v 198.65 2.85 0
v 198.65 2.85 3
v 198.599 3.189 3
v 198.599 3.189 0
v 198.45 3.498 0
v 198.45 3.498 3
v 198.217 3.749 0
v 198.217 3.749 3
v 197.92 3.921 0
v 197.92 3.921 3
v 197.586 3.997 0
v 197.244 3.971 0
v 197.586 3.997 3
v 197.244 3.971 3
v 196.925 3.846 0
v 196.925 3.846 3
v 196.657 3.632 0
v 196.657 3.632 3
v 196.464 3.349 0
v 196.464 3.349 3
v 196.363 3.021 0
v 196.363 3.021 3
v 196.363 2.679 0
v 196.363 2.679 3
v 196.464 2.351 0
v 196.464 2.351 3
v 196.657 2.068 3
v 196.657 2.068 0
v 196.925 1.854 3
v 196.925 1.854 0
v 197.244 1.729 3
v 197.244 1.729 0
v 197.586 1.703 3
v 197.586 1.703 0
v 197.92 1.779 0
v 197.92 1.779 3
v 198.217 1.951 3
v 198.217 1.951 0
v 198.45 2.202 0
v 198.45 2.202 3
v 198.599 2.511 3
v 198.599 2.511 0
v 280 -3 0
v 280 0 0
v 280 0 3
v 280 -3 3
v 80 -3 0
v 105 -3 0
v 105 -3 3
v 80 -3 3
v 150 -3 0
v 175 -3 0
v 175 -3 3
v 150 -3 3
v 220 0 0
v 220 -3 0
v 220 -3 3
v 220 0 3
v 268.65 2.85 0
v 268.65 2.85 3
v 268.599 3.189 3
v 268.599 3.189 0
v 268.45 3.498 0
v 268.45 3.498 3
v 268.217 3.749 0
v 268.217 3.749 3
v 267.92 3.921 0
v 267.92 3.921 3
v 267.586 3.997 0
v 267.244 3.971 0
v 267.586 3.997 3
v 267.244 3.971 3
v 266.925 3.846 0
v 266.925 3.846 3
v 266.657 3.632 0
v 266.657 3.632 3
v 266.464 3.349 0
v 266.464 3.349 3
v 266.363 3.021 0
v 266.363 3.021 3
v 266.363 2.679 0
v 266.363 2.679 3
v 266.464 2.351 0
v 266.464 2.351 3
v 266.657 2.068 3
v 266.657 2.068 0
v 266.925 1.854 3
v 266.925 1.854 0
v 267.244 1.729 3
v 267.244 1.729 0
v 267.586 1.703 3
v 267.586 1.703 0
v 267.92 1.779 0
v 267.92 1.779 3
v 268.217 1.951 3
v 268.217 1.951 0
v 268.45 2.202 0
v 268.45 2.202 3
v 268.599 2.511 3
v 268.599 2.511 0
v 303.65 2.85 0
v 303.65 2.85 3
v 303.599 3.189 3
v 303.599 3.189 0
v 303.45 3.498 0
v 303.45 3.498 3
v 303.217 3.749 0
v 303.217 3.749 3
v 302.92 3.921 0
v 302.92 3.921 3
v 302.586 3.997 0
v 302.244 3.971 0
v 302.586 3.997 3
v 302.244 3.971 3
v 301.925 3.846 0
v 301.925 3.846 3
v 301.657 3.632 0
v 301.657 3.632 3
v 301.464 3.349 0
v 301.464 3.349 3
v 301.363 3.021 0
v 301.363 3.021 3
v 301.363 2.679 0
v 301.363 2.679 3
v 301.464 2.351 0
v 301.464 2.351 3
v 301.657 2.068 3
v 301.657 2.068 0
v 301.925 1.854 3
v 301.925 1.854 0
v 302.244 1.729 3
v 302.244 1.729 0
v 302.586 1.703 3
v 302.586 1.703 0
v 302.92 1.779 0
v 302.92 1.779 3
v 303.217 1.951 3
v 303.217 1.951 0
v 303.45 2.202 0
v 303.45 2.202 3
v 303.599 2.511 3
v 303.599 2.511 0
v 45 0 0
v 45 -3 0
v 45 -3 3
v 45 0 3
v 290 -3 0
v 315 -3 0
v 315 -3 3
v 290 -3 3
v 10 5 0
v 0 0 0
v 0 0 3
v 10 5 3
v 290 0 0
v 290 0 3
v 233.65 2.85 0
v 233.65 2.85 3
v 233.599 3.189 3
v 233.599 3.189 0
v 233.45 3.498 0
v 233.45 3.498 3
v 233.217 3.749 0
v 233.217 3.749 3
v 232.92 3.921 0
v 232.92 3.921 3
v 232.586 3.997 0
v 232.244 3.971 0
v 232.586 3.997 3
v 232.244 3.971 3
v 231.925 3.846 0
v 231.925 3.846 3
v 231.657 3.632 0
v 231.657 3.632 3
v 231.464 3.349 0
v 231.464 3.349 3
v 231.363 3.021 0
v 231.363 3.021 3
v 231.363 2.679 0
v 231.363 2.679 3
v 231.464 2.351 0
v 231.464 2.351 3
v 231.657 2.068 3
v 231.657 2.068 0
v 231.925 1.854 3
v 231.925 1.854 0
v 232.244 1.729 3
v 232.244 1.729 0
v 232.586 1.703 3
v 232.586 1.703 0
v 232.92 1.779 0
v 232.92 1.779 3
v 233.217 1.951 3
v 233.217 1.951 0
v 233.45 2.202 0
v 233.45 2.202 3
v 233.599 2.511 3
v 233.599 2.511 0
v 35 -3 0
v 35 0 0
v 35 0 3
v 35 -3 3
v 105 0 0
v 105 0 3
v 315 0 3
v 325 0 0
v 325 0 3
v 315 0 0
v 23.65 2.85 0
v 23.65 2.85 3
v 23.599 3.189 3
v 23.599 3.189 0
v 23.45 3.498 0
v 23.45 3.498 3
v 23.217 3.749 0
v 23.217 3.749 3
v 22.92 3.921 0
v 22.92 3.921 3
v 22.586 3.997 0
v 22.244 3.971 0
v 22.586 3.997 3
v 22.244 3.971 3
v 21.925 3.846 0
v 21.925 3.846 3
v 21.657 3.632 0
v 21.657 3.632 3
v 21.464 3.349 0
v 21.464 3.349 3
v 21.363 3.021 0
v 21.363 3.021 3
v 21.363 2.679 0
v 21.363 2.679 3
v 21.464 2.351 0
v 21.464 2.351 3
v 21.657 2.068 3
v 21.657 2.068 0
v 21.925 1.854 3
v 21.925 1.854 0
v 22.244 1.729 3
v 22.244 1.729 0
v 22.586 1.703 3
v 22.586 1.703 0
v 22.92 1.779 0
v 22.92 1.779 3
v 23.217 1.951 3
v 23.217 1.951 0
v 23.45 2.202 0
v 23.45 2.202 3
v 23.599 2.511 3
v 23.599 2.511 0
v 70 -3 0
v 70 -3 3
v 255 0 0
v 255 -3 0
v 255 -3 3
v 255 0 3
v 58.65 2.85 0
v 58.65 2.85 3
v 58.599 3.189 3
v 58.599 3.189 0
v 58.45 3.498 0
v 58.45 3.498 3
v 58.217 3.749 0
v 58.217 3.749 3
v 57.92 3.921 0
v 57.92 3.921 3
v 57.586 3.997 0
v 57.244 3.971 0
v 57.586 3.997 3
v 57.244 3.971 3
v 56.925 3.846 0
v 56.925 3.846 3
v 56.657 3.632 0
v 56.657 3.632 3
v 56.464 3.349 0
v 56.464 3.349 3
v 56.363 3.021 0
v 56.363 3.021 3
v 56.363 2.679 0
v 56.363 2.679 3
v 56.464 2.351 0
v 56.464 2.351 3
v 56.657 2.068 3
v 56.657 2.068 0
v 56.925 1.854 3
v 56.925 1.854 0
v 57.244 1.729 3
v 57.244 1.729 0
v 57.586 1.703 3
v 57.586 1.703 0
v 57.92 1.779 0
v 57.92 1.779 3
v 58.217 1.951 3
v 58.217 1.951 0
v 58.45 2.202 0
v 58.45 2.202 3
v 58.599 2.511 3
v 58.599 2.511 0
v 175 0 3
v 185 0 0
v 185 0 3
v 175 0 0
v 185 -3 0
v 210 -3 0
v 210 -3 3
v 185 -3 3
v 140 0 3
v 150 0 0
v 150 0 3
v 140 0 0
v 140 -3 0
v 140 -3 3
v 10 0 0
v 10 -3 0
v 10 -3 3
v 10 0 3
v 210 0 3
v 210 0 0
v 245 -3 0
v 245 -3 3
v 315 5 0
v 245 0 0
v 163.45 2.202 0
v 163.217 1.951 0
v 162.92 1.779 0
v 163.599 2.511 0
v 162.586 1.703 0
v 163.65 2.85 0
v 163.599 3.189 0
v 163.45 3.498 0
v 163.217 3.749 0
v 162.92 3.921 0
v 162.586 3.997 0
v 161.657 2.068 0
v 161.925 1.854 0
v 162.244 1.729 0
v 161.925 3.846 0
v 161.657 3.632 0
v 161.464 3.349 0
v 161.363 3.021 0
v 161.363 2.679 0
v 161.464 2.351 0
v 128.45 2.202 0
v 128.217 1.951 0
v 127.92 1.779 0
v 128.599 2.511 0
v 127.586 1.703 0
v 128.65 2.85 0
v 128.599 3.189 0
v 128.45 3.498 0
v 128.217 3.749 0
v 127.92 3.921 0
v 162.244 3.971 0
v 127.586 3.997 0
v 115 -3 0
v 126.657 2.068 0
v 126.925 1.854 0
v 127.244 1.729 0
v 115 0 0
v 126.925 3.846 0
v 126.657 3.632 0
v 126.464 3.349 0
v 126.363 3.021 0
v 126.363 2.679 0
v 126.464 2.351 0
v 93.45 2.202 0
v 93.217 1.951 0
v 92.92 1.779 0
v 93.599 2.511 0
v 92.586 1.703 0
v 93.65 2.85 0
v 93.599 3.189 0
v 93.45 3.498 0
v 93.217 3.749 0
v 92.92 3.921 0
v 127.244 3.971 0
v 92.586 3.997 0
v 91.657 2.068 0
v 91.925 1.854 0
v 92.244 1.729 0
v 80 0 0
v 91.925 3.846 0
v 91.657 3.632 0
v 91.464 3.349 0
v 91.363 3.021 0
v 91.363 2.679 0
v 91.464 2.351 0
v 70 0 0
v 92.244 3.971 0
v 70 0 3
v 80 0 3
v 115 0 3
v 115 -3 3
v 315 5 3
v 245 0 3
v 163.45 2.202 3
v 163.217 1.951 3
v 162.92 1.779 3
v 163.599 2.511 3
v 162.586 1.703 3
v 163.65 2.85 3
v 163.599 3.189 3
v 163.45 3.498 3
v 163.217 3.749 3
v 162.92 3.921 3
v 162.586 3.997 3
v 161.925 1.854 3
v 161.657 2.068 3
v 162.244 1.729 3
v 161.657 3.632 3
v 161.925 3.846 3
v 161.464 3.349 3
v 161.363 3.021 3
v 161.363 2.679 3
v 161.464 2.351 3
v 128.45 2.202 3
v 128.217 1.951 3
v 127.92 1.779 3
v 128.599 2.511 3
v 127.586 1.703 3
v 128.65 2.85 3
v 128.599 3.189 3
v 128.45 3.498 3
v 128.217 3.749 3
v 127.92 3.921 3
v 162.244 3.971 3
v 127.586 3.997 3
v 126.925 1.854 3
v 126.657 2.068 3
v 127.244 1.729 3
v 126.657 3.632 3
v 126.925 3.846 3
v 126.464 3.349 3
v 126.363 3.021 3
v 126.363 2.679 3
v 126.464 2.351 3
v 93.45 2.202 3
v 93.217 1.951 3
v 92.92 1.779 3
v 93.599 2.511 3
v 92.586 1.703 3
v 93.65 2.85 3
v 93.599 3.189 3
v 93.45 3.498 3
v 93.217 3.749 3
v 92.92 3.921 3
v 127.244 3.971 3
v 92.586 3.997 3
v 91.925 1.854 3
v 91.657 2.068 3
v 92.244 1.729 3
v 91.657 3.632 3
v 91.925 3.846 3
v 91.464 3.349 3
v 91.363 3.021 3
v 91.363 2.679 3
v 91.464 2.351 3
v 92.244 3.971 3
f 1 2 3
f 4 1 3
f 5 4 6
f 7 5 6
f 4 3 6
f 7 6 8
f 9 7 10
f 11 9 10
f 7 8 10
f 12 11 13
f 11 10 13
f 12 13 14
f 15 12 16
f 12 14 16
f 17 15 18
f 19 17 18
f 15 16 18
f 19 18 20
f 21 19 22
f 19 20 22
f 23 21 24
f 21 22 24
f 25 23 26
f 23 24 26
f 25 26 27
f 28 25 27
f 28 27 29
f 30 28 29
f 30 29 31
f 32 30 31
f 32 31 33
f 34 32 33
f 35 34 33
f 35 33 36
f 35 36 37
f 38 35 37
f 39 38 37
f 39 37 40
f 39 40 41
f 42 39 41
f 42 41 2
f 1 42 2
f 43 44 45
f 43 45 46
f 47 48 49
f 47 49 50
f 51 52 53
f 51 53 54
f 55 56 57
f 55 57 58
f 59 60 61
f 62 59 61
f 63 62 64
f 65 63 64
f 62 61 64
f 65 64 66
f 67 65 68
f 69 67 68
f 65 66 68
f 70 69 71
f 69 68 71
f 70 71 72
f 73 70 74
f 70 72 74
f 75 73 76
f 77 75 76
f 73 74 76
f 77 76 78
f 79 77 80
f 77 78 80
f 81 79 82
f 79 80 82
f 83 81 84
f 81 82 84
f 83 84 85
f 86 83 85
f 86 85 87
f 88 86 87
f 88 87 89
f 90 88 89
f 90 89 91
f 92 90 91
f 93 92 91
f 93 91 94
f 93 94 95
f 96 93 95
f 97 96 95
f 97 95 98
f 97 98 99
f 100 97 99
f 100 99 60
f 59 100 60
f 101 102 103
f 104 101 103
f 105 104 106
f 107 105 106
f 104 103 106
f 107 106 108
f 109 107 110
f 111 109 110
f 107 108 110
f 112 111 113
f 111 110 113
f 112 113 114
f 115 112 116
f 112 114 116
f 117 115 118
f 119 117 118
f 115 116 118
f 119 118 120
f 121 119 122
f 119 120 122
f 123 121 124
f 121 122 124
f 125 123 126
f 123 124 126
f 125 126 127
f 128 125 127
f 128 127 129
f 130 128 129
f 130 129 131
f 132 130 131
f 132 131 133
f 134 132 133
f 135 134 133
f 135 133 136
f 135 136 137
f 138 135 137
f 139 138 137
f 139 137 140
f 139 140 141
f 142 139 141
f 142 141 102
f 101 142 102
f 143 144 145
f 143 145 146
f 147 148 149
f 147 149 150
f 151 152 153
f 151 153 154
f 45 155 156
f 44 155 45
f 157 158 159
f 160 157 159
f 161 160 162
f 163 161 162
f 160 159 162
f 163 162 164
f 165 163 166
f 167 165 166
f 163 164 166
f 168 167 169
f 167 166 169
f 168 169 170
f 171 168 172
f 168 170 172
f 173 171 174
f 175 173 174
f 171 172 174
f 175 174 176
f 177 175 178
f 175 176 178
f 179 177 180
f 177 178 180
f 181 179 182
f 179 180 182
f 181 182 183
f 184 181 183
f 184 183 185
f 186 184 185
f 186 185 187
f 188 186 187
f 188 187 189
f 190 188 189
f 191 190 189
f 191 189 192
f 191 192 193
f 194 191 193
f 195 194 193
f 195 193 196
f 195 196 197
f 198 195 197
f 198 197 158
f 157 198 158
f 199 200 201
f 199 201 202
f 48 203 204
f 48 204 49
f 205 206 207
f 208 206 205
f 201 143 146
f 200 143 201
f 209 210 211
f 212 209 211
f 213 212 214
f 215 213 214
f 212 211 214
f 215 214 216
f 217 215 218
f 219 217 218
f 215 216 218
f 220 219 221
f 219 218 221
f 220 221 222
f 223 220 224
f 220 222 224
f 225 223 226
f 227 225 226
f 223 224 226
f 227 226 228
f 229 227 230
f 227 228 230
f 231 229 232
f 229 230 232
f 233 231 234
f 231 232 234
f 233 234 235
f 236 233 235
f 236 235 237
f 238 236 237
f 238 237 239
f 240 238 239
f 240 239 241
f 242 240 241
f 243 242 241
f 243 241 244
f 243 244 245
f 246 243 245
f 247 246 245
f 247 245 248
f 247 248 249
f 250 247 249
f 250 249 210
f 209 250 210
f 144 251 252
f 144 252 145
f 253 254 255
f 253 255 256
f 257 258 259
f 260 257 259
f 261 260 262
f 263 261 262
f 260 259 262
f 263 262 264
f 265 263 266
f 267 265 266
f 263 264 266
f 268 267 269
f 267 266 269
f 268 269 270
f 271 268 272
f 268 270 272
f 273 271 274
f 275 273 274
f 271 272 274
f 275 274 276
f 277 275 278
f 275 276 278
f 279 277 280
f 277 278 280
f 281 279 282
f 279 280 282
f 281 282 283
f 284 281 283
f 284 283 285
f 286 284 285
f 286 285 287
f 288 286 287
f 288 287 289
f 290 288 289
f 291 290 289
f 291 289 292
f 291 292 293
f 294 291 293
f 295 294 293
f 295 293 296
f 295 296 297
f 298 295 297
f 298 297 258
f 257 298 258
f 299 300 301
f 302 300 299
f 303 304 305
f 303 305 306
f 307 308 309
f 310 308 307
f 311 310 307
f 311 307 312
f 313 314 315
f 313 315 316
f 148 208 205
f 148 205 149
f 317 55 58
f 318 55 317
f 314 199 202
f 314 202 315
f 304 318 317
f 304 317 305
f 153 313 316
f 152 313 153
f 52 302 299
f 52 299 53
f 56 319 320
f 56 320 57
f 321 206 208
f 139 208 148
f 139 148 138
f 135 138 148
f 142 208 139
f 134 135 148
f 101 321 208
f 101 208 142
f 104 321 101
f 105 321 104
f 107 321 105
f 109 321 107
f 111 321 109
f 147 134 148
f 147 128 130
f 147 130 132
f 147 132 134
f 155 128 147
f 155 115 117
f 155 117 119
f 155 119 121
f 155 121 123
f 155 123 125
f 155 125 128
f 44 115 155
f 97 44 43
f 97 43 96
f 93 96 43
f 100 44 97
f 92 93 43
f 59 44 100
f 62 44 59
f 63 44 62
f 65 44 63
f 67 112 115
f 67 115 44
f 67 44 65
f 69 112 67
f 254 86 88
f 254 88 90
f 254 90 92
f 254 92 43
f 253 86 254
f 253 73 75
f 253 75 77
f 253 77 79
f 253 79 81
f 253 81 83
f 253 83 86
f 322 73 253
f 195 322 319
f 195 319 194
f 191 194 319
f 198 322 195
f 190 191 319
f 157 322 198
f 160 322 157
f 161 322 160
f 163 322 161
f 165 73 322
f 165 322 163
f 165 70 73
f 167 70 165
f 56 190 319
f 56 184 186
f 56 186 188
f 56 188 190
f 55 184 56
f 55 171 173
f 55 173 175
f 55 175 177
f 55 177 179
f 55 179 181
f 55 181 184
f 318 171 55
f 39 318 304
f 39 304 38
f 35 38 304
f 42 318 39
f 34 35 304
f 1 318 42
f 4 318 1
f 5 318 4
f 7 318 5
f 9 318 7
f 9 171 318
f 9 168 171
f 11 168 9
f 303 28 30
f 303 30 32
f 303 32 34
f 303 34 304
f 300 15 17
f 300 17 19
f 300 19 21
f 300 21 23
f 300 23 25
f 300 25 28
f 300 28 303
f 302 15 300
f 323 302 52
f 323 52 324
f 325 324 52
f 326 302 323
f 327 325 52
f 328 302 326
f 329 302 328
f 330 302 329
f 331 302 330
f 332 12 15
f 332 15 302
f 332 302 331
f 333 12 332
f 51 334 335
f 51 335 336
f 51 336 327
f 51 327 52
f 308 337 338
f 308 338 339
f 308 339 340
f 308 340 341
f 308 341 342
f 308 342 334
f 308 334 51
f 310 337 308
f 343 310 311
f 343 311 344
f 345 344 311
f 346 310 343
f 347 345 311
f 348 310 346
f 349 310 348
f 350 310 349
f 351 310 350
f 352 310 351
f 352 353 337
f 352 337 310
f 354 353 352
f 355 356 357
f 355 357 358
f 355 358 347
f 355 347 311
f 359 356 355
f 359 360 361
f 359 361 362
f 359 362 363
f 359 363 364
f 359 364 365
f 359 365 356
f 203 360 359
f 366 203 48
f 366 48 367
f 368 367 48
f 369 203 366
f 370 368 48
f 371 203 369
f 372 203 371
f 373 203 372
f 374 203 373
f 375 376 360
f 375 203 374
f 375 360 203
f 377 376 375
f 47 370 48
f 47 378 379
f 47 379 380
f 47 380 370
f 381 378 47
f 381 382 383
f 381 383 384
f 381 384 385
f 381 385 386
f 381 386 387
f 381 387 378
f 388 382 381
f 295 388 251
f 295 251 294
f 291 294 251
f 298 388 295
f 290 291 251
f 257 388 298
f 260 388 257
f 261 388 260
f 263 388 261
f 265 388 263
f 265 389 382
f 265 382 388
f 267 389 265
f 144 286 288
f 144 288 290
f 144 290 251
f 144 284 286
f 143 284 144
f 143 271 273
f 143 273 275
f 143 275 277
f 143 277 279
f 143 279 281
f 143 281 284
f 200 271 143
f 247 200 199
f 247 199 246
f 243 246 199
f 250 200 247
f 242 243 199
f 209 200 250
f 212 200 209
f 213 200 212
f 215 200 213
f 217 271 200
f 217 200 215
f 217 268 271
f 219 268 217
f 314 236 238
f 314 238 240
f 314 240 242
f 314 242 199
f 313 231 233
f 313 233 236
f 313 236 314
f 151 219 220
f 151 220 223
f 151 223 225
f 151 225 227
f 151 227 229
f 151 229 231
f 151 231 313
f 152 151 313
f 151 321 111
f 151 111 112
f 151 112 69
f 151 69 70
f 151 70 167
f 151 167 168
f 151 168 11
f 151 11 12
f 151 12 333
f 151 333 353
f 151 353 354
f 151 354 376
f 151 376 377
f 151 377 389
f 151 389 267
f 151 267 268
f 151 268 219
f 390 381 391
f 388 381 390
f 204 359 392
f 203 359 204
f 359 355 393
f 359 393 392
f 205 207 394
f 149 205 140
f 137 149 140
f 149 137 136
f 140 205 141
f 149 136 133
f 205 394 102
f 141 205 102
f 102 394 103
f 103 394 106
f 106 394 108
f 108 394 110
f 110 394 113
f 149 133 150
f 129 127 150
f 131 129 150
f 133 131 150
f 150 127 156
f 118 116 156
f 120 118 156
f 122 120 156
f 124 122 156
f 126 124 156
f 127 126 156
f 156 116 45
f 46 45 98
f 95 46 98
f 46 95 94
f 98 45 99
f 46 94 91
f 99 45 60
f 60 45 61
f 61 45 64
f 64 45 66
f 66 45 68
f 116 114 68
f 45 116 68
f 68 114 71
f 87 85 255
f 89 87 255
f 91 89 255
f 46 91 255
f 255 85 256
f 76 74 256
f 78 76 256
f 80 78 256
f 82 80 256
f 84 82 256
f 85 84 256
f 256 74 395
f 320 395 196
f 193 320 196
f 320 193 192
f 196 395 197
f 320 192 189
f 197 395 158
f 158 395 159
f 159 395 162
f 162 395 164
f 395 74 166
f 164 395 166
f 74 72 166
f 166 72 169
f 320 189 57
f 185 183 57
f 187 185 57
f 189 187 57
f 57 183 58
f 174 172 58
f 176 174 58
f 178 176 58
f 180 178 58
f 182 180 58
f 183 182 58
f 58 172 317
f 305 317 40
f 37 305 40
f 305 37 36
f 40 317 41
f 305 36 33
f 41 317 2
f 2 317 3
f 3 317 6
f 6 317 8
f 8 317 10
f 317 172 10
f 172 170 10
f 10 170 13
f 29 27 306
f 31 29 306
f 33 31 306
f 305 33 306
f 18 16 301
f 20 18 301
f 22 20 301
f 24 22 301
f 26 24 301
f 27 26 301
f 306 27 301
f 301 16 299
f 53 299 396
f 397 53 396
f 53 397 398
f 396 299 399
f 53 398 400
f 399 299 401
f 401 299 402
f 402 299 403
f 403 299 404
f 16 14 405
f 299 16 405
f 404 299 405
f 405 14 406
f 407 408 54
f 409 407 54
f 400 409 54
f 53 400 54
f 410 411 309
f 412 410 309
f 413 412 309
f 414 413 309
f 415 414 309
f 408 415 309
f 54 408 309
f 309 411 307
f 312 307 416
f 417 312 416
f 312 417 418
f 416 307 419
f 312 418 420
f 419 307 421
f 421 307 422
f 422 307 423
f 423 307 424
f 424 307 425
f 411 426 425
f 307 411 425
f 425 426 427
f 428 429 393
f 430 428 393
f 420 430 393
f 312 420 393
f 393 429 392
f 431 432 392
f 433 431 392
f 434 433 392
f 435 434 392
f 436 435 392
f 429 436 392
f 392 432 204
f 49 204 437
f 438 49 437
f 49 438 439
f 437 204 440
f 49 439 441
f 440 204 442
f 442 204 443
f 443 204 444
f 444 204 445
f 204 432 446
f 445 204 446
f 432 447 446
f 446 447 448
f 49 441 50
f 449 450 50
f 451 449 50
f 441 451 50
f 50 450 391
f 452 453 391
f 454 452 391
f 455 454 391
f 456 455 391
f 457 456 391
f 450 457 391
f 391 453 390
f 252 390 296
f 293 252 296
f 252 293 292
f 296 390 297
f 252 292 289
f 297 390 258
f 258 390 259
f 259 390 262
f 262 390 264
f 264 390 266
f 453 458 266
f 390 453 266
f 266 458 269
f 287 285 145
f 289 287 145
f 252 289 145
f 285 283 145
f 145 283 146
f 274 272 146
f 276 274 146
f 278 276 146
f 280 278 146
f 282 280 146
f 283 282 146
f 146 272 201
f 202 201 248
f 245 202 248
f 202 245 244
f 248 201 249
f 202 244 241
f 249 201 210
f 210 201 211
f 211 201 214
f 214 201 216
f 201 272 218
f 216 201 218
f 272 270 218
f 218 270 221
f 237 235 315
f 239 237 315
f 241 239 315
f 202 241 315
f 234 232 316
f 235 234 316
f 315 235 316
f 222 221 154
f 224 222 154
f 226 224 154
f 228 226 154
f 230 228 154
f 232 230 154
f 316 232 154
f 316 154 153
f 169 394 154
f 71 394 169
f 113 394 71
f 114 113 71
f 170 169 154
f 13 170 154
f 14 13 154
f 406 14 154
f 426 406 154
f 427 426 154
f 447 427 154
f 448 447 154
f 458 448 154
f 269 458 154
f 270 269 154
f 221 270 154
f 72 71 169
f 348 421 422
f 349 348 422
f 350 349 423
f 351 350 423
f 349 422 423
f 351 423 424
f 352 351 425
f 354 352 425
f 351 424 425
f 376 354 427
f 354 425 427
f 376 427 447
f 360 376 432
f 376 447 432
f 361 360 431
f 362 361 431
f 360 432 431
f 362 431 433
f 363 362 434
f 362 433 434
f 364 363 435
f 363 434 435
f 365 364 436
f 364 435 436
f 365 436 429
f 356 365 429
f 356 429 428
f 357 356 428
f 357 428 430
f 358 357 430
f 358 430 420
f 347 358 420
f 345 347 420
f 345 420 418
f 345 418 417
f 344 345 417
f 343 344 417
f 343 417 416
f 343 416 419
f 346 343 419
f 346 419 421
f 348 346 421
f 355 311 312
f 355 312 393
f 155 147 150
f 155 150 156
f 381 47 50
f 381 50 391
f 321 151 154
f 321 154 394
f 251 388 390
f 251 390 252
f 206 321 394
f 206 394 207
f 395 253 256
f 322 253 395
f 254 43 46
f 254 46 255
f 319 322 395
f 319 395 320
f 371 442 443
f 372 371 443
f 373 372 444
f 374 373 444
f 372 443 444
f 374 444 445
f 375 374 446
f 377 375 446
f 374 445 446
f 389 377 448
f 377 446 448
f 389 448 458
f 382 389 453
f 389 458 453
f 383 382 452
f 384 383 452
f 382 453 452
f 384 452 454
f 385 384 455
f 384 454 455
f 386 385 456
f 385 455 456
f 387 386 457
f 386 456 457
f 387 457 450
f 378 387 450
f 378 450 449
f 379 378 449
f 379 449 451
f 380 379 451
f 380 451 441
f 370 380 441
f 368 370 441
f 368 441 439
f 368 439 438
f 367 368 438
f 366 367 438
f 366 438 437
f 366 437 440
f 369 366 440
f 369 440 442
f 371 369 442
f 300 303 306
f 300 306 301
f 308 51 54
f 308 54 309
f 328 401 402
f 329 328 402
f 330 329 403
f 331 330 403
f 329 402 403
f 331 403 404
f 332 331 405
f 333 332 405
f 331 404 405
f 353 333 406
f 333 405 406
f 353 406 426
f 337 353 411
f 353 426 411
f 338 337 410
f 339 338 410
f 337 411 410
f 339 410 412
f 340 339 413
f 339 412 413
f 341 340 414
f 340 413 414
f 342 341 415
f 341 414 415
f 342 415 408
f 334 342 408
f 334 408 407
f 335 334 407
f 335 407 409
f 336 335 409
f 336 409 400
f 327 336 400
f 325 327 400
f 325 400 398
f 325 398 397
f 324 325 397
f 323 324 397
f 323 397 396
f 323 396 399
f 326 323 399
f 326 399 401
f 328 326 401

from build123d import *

# Parameters (mm, degrees)
EXTRUDE_1_DEPTH     = 3
SKETCH_2_R          = 1.15
CUT_EXTRUDE_1_DEPTH = 326.052303484


with BuildPart() as part:
    # 草图1 → 凸台-拉伸1 (new body)
    with BuildSketch(Plane.XY):
        Polygon((0, 0), (10, 5), (315, 5), (325, 0), (315, 0), (315, -3), (290, -3), (290, 0), (280, 0), (280, -3), (255, -3), (255, 0), (245, 0), (245, -3), (220, -3), (220, 0), (210, 0), (210, -3), (185, -3), (185, 0), (175, 0), (175, -3), (150, -3), (150, 0), (140, 0), (140, -3), (115, -3), (115, 0), (105, 0), (105, -3), (80, -3), (80, 0), (70, 0), (70, -3), (45, -3), (45, 0), (35, 0), (35, -3), (10, -3), (10, 0), align=None)
    extrude(amount=EXTRUDE_1_DEPTH)

    # 草图2 → 切除-拉伸1 (cut, through all)
    with BuildSketch(Plane.XY.offset(3)):
        with Locations((22.5, 2.85)):
            Circle(SKETCH_2_R)
        with Locations((57.5, 2.85)):
            Circle(SKETCH_2_R)
        with Locations((92.5, 2.85)):
            Circle(SKETCH_2_R)
        with Locations((127.5, 2.85)):
            Circle(SKETCH_2_R)
        with Locations((162.5, 2.85)):
            Circle(SKETCH_2_R)
        with Locations((197.5, 2.85)):
            Circle(SKETCH_2_R)
        with Locations((232.5, 2.85)):
            Circle(SKETCH_2_R)
        with Locations((267.5, 2.85)):
            Circle(SKETCH_2_R)
        with Locations((302.5, 2.85)):
            Circle(SKETCH_2_R)
    extrude(amount=-CUT_EXTRUDE_1_DEPTH, mode=Mode.SUBTRACT)


solid = part.part
